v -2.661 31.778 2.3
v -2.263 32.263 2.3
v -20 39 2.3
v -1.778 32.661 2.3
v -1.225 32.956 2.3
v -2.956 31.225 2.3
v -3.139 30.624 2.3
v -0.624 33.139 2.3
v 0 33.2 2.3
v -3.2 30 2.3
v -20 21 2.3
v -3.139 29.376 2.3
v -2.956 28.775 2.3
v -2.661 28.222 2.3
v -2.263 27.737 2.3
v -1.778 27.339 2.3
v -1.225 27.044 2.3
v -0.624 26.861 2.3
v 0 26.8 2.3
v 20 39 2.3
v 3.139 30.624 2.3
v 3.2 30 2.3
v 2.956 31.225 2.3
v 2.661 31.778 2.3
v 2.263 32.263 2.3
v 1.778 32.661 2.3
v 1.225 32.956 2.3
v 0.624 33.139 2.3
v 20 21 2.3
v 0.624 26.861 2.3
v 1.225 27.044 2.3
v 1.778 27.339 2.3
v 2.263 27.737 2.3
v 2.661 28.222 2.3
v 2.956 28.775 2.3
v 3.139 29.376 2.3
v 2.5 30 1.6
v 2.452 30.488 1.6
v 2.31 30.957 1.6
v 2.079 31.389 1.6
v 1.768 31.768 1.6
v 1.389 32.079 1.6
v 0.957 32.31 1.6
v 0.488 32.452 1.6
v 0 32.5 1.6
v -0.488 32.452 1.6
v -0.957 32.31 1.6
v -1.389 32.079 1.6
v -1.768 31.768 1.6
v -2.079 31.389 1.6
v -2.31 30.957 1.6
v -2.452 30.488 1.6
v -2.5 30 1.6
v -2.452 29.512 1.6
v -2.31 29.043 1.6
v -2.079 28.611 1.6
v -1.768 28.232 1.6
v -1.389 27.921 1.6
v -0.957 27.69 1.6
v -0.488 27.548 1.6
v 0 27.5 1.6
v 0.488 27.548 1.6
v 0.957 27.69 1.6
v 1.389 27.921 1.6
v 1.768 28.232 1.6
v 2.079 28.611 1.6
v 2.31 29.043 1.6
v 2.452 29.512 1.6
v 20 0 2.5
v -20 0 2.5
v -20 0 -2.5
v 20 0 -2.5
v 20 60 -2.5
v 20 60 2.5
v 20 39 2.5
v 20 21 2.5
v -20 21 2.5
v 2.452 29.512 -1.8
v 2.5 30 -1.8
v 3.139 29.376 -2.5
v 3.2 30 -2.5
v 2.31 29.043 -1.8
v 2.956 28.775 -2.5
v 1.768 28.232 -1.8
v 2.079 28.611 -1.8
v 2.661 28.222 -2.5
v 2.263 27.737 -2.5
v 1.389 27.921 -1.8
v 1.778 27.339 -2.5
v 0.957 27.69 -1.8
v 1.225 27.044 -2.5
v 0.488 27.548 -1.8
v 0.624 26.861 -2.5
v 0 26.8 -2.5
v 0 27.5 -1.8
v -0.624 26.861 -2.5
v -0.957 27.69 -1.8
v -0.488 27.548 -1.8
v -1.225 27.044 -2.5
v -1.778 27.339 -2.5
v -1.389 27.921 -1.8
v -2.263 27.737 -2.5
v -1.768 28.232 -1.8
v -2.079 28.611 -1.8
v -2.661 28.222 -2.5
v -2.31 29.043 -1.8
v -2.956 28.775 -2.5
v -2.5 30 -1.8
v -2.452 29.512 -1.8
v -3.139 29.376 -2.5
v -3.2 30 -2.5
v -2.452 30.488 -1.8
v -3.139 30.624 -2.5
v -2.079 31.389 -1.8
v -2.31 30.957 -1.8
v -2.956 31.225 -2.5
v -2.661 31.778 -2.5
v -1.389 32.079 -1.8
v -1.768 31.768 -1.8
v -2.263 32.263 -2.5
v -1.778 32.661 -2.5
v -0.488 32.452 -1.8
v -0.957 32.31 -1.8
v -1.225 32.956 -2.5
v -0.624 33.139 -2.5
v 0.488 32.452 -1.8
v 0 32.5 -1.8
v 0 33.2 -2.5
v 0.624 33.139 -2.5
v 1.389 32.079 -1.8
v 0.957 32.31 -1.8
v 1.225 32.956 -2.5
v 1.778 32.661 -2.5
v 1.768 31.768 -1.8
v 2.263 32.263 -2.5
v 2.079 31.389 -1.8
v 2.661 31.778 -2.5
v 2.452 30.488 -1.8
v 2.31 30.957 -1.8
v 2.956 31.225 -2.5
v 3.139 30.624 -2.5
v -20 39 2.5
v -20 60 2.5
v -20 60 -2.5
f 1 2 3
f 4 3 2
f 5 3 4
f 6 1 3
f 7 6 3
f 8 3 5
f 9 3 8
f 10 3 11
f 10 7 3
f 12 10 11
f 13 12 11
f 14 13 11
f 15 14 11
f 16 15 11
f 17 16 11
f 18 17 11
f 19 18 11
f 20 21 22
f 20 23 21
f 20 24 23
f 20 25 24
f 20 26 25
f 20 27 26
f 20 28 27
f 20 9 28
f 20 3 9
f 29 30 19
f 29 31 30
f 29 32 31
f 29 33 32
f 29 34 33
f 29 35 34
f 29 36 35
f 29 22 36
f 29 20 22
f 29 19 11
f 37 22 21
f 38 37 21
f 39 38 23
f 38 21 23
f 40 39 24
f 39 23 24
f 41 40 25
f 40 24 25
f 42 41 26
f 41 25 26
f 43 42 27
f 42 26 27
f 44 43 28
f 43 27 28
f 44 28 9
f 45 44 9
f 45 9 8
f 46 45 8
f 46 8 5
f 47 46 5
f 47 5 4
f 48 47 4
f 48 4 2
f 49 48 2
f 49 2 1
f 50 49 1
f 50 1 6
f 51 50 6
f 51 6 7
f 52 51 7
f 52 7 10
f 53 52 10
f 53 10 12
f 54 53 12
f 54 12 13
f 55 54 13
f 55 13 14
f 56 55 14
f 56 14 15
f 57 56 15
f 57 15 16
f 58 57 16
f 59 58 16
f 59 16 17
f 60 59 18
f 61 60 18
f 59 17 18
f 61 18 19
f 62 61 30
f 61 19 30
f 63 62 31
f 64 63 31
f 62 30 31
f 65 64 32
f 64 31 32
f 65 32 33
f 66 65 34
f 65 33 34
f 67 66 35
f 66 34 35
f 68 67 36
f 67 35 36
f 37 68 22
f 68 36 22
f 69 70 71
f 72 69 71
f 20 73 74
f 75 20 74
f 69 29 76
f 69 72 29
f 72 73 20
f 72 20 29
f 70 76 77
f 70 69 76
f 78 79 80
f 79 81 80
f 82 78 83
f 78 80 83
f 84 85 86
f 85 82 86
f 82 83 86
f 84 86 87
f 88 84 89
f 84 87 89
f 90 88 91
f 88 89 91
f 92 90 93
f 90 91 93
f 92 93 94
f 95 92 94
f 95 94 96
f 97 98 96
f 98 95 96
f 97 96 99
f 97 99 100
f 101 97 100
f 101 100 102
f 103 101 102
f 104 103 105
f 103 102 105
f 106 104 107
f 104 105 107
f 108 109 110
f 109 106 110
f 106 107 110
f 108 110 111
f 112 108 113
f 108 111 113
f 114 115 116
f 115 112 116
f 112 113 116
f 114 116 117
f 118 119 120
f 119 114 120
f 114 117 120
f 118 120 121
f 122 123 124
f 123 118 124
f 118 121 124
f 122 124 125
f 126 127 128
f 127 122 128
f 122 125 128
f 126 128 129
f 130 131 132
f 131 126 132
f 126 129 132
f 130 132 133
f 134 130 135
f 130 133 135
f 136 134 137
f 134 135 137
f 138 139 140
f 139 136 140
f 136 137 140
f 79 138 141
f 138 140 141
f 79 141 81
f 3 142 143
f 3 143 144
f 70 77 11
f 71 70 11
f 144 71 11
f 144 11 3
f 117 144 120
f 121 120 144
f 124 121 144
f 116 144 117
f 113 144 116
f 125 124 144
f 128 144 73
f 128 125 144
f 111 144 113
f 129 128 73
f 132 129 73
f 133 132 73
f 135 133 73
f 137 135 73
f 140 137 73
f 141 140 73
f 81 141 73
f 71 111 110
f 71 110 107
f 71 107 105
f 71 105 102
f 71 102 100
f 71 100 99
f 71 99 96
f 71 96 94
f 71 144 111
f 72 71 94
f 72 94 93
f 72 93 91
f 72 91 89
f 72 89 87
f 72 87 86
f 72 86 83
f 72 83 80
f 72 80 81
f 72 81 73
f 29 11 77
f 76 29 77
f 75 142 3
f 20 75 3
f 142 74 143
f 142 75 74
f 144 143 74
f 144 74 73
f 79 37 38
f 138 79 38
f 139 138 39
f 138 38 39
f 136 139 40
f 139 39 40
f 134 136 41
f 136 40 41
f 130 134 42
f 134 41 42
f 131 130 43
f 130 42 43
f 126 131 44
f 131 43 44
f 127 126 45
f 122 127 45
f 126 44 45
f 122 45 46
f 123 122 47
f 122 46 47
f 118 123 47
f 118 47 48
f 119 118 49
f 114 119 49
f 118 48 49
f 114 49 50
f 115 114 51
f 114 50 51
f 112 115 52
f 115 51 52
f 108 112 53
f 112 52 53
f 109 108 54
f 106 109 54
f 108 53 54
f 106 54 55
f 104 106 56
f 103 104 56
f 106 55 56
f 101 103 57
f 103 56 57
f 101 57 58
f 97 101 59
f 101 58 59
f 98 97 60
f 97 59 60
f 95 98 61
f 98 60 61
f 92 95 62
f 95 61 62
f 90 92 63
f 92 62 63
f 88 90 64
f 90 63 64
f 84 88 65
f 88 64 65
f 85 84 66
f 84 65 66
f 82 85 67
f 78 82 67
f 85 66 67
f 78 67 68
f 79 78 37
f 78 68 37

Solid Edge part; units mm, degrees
sketch "Sketch1" plane through (0, 0, 0) normal (0, -1, 0) x (1, 0, 0)
  line L0 (-20, -2.5) -> (20, -2.5)
  line L1 (20, -2.5) -> (20, 2.5)
  line L2 (20, 2.5) -> (-20, 2.5)
  line L3 (-20, 2.5) -> (-20, -2.5)
  dimension "D1" = 40
  dimension "D2" = 5
extrude "Protrusion1" add sketch "Sketch1" against normal blind 60
sketch "Sketch2" plane through (20, 30, 0) normal (1, 0, 0) x (0, 1, 0)
  line L0 (-9, 2.5) -> (9, 2.5)
  line L1 (9, 2.5) -> (9, 2.3)
  line L2 (9, 2.3) -> (-9, 2.3)
  line L3 (-9, 2.3) -> (-9, 2.5)
  dimension "D1" = 18
  dimension "D2" = 0.2
extrude "Cutout1" cut sketch "Sketch2" against normal through all
sketch "Sketch3" plane through (0, 49.5, 2.5) normal (0, 0, 1) x (1, 0, 0)
  circle A0 centre (0, -19.5) radius 2.5
  dimension "D1" = 5
extrude "Cutout2" cut sketch "Sketch3" against normal through all
chamfer "Fase_1" distance 0.7 angle 45 2 edges at (0, 32.5, 2.3) (2.5, 30, -2.5)
properties material "Nylon, allgemein"
